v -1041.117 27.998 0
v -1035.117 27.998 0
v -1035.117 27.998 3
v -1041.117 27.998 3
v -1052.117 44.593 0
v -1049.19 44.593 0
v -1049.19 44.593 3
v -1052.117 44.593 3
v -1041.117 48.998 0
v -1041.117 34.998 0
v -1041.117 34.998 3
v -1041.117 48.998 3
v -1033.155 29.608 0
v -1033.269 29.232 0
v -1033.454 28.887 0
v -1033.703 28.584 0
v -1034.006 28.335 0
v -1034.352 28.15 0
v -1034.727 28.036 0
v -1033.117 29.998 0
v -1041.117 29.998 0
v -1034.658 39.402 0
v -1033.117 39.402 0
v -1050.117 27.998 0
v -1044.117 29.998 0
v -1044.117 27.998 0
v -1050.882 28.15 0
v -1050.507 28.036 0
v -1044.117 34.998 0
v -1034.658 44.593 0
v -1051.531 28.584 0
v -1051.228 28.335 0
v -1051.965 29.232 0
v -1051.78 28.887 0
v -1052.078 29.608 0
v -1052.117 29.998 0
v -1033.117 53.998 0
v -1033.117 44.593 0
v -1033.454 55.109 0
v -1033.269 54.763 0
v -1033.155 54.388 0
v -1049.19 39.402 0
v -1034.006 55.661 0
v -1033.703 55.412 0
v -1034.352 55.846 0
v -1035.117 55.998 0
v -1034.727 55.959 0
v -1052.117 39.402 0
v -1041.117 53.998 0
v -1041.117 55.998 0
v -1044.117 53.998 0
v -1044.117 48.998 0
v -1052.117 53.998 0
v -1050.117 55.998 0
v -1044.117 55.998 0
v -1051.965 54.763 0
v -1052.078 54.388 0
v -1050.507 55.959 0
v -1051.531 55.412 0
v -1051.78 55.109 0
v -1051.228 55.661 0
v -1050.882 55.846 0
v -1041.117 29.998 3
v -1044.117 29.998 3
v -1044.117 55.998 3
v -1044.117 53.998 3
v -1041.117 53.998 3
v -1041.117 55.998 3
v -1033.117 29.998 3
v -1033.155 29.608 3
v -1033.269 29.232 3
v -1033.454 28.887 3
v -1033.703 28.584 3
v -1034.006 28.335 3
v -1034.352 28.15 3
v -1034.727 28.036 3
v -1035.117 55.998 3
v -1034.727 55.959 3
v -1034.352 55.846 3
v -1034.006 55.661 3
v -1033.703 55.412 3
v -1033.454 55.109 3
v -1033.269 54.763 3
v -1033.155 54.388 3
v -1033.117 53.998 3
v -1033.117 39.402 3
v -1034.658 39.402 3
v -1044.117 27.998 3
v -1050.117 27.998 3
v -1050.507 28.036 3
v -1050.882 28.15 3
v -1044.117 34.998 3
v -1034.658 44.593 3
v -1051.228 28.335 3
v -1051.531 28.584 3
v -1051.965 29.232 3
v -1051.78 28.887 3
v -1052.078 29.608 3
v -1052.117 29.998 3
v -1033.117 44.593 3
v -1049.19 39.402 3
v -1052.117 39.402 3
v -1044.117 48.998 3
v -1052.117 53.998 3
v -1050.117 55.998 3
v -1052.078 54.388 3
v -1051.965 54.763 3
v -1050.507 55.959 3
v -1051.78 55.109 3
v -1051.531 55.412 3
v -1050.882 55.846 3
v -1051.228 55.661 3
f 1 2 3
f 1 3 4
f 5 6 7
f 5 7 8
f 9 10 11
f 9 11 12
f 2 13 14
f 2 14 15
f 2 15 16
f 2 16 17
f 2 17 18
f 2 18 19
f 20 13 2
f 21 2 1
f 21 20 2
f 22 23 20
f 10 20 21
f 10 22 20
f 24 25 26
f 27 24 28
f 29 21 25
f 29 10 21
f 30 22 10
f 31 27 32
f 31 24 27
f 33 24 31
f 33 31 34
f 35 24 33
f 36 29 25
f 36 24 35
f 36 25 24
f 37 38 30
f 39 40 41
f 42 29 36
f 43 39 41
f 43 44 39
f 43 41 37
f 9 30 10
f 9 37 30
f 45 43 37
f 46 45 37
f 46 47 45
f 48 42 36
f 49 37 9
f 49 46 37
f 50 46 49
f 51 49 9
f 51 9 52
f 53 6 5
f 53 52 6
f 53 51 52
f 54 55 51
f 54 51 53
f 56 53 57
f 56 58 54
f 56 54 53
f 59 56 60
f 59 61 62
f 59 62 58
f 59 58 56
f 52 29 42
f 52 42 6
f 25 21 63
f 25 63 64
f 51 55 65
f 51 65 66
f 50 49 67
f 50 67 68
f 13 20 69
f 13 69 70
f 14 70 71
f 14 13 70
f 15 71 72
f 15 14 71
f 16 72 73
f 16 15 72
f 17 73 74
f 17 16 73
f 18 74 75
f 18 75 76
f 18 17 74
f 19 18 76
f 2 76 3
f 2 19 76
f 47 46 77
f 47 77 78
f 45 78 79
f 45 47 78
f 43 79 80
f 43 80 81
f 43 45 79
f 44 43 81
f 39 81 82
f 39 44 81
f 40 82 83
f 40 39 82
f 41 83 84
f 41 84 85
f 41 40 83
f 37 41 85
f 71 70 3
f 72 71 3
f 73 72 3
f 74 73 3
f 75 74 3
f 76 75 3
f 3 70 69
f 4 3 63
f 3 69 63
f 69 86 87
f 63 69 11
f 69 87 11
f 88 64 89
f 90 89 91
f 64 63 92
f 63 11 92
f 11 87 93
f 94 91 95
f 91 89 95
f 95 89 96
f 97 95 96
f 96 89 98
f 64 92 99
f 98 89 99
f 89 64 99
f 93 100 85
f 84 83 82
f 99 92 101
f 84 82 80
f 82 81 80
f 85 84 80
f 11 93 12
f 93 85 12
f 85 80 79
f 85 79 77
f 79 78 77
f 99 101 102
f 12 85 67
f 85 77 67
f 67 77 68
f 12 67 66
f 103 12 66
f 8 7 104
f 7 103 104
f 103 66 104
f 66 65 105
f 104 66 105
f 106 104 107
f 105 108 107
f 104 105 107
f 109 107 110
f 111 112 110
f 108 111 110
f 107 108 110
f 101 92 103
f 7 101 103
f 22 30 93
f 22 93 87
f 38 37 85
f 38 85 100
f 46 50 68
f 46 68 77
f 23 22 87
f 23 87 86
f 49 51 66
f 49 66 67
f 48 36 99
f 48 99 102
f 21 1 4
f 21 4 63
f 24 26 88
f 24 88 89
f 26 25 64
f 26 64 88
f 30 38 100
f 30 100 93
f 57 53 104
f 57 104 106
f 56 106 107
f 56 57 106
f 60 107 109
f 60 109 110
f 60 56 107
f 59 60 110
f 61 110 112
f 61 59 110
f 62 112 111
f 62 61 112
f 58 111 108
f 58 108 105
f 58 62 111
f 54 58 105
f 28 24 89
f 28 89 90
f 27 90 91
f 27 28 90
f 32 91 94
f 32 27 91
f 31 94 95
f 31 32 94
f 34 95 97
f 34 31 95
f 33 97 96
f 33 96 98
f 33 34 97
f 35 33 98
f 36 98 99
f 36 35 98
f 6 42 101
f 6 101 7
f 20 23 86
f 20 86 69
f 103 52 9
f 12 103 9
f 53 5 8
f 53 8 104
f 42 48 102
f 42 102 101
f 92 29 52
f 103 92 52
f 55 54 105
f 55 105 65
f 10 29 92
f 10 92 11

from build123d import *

# Parameters (mm, degrees)
SKETCH1_W          = 3
SKETCH1_H          = 14
BASE_EXTRUDE_DEPTH = 3


with BuildPart() as part:
    # Sketch1 → Base-Extrude (new body)
    with BuildSketch(Plane.XY):
        with BuildLine():
            Line((-1033.116910611, 53.997744838), (-1033.116910611, 44.593073912))
            Line((-1033.116910611, 44.593073912), (-1034.65769353, 44.593073912))
            Line((-1034.65769353, 44.593073912), (-1034.65769353, 39.402415763))
            Line((-1034.65769353, 39.402415763), (-1033.116910611, 39.402415763))
            Line((-1033.116910611, 39.402415763), (-1033.116910611, 29.997744838))
            ThreePointArc((-1033.116910611, 29.997744838), (-1033.702697049, 28.583531275), (-1035.116910611, 27.997744838))
            Line((-1035.116910611, 27.997744838), (-1041.116910611, 27.997744838))
            Line((-1041.116910611, 27.997744838), (-1041.116910611, 29.997744838))
            Line((-1041.116910611, 29.997744838), (-1042.616910611, 29.997744838))
            Line((-1042.616910611, 29.997744838), (-1044.116910611, 29.997744838))
            Line((-1044.116910611, 29.997744838), (-1044.116910611, 27.997744838))
            Line((-1044.116910611, 27.997744838), (-1050.116910611, 27.997744838))
            ThreePointArc((-1050.116910611, 27.997744838), (-1051.531124173, 28.583531275), (-1052.116910611, 29.997744838))
            Line((-1052.116910611, 29.997744838), (-1052.116910611, 39.402415763))
            Line((-1052.116910611, 39.402415763), (-1049.190418334, 39.402415763))
            Line((-1049.190418334, 39.402415763), (-1049.190418334, 44.593073912))
            Line((-1049.190418334, 44.593073912), (-1052.116910611, 44.593073912))
            Line((-1052.116910611, 44.593073912), (-1052.116910611, 53.997744838))
            ThreePointArc((-1052.116910611, 53.997744838), (-1051.531124173, 55.4119584), (-1050.116910611, 55.997744838))
            Line((-1050.116910611, 55.997744838), (-1044.116910611, 55.997744838))
            Line((-1044.116910611, 55.997744838), (-1044.116910611, 53.997744838))
            Line((-1044.116910611, 53.997744838), (-1042.616910611, 53.997744838))
            Line((-1042.616910611, 53.997744838), (-1041.116910611, 53.997744838))
            Line((-1041.116910611, 53.997744838), (-1041.116910611, 55.997744838))
            Line((-1041.116910611, 55.997744838), (-1035.116910611, 55.997744838))
            ThreePointArc((-1035.116910611, 55.997744838), (-1033.702697049, 55.4119584), (-1033.116910611, 53.997744838))
        make_face()
        with Locations((-1042.616910611, 41.997744838)):
            Rectangle(SKETCH1_W, SKETCH1_H, mode=Mode.SUBTRACT)
    extrude(amount=BASE_EXTRUDE_DEPTH)


solid = part.part
